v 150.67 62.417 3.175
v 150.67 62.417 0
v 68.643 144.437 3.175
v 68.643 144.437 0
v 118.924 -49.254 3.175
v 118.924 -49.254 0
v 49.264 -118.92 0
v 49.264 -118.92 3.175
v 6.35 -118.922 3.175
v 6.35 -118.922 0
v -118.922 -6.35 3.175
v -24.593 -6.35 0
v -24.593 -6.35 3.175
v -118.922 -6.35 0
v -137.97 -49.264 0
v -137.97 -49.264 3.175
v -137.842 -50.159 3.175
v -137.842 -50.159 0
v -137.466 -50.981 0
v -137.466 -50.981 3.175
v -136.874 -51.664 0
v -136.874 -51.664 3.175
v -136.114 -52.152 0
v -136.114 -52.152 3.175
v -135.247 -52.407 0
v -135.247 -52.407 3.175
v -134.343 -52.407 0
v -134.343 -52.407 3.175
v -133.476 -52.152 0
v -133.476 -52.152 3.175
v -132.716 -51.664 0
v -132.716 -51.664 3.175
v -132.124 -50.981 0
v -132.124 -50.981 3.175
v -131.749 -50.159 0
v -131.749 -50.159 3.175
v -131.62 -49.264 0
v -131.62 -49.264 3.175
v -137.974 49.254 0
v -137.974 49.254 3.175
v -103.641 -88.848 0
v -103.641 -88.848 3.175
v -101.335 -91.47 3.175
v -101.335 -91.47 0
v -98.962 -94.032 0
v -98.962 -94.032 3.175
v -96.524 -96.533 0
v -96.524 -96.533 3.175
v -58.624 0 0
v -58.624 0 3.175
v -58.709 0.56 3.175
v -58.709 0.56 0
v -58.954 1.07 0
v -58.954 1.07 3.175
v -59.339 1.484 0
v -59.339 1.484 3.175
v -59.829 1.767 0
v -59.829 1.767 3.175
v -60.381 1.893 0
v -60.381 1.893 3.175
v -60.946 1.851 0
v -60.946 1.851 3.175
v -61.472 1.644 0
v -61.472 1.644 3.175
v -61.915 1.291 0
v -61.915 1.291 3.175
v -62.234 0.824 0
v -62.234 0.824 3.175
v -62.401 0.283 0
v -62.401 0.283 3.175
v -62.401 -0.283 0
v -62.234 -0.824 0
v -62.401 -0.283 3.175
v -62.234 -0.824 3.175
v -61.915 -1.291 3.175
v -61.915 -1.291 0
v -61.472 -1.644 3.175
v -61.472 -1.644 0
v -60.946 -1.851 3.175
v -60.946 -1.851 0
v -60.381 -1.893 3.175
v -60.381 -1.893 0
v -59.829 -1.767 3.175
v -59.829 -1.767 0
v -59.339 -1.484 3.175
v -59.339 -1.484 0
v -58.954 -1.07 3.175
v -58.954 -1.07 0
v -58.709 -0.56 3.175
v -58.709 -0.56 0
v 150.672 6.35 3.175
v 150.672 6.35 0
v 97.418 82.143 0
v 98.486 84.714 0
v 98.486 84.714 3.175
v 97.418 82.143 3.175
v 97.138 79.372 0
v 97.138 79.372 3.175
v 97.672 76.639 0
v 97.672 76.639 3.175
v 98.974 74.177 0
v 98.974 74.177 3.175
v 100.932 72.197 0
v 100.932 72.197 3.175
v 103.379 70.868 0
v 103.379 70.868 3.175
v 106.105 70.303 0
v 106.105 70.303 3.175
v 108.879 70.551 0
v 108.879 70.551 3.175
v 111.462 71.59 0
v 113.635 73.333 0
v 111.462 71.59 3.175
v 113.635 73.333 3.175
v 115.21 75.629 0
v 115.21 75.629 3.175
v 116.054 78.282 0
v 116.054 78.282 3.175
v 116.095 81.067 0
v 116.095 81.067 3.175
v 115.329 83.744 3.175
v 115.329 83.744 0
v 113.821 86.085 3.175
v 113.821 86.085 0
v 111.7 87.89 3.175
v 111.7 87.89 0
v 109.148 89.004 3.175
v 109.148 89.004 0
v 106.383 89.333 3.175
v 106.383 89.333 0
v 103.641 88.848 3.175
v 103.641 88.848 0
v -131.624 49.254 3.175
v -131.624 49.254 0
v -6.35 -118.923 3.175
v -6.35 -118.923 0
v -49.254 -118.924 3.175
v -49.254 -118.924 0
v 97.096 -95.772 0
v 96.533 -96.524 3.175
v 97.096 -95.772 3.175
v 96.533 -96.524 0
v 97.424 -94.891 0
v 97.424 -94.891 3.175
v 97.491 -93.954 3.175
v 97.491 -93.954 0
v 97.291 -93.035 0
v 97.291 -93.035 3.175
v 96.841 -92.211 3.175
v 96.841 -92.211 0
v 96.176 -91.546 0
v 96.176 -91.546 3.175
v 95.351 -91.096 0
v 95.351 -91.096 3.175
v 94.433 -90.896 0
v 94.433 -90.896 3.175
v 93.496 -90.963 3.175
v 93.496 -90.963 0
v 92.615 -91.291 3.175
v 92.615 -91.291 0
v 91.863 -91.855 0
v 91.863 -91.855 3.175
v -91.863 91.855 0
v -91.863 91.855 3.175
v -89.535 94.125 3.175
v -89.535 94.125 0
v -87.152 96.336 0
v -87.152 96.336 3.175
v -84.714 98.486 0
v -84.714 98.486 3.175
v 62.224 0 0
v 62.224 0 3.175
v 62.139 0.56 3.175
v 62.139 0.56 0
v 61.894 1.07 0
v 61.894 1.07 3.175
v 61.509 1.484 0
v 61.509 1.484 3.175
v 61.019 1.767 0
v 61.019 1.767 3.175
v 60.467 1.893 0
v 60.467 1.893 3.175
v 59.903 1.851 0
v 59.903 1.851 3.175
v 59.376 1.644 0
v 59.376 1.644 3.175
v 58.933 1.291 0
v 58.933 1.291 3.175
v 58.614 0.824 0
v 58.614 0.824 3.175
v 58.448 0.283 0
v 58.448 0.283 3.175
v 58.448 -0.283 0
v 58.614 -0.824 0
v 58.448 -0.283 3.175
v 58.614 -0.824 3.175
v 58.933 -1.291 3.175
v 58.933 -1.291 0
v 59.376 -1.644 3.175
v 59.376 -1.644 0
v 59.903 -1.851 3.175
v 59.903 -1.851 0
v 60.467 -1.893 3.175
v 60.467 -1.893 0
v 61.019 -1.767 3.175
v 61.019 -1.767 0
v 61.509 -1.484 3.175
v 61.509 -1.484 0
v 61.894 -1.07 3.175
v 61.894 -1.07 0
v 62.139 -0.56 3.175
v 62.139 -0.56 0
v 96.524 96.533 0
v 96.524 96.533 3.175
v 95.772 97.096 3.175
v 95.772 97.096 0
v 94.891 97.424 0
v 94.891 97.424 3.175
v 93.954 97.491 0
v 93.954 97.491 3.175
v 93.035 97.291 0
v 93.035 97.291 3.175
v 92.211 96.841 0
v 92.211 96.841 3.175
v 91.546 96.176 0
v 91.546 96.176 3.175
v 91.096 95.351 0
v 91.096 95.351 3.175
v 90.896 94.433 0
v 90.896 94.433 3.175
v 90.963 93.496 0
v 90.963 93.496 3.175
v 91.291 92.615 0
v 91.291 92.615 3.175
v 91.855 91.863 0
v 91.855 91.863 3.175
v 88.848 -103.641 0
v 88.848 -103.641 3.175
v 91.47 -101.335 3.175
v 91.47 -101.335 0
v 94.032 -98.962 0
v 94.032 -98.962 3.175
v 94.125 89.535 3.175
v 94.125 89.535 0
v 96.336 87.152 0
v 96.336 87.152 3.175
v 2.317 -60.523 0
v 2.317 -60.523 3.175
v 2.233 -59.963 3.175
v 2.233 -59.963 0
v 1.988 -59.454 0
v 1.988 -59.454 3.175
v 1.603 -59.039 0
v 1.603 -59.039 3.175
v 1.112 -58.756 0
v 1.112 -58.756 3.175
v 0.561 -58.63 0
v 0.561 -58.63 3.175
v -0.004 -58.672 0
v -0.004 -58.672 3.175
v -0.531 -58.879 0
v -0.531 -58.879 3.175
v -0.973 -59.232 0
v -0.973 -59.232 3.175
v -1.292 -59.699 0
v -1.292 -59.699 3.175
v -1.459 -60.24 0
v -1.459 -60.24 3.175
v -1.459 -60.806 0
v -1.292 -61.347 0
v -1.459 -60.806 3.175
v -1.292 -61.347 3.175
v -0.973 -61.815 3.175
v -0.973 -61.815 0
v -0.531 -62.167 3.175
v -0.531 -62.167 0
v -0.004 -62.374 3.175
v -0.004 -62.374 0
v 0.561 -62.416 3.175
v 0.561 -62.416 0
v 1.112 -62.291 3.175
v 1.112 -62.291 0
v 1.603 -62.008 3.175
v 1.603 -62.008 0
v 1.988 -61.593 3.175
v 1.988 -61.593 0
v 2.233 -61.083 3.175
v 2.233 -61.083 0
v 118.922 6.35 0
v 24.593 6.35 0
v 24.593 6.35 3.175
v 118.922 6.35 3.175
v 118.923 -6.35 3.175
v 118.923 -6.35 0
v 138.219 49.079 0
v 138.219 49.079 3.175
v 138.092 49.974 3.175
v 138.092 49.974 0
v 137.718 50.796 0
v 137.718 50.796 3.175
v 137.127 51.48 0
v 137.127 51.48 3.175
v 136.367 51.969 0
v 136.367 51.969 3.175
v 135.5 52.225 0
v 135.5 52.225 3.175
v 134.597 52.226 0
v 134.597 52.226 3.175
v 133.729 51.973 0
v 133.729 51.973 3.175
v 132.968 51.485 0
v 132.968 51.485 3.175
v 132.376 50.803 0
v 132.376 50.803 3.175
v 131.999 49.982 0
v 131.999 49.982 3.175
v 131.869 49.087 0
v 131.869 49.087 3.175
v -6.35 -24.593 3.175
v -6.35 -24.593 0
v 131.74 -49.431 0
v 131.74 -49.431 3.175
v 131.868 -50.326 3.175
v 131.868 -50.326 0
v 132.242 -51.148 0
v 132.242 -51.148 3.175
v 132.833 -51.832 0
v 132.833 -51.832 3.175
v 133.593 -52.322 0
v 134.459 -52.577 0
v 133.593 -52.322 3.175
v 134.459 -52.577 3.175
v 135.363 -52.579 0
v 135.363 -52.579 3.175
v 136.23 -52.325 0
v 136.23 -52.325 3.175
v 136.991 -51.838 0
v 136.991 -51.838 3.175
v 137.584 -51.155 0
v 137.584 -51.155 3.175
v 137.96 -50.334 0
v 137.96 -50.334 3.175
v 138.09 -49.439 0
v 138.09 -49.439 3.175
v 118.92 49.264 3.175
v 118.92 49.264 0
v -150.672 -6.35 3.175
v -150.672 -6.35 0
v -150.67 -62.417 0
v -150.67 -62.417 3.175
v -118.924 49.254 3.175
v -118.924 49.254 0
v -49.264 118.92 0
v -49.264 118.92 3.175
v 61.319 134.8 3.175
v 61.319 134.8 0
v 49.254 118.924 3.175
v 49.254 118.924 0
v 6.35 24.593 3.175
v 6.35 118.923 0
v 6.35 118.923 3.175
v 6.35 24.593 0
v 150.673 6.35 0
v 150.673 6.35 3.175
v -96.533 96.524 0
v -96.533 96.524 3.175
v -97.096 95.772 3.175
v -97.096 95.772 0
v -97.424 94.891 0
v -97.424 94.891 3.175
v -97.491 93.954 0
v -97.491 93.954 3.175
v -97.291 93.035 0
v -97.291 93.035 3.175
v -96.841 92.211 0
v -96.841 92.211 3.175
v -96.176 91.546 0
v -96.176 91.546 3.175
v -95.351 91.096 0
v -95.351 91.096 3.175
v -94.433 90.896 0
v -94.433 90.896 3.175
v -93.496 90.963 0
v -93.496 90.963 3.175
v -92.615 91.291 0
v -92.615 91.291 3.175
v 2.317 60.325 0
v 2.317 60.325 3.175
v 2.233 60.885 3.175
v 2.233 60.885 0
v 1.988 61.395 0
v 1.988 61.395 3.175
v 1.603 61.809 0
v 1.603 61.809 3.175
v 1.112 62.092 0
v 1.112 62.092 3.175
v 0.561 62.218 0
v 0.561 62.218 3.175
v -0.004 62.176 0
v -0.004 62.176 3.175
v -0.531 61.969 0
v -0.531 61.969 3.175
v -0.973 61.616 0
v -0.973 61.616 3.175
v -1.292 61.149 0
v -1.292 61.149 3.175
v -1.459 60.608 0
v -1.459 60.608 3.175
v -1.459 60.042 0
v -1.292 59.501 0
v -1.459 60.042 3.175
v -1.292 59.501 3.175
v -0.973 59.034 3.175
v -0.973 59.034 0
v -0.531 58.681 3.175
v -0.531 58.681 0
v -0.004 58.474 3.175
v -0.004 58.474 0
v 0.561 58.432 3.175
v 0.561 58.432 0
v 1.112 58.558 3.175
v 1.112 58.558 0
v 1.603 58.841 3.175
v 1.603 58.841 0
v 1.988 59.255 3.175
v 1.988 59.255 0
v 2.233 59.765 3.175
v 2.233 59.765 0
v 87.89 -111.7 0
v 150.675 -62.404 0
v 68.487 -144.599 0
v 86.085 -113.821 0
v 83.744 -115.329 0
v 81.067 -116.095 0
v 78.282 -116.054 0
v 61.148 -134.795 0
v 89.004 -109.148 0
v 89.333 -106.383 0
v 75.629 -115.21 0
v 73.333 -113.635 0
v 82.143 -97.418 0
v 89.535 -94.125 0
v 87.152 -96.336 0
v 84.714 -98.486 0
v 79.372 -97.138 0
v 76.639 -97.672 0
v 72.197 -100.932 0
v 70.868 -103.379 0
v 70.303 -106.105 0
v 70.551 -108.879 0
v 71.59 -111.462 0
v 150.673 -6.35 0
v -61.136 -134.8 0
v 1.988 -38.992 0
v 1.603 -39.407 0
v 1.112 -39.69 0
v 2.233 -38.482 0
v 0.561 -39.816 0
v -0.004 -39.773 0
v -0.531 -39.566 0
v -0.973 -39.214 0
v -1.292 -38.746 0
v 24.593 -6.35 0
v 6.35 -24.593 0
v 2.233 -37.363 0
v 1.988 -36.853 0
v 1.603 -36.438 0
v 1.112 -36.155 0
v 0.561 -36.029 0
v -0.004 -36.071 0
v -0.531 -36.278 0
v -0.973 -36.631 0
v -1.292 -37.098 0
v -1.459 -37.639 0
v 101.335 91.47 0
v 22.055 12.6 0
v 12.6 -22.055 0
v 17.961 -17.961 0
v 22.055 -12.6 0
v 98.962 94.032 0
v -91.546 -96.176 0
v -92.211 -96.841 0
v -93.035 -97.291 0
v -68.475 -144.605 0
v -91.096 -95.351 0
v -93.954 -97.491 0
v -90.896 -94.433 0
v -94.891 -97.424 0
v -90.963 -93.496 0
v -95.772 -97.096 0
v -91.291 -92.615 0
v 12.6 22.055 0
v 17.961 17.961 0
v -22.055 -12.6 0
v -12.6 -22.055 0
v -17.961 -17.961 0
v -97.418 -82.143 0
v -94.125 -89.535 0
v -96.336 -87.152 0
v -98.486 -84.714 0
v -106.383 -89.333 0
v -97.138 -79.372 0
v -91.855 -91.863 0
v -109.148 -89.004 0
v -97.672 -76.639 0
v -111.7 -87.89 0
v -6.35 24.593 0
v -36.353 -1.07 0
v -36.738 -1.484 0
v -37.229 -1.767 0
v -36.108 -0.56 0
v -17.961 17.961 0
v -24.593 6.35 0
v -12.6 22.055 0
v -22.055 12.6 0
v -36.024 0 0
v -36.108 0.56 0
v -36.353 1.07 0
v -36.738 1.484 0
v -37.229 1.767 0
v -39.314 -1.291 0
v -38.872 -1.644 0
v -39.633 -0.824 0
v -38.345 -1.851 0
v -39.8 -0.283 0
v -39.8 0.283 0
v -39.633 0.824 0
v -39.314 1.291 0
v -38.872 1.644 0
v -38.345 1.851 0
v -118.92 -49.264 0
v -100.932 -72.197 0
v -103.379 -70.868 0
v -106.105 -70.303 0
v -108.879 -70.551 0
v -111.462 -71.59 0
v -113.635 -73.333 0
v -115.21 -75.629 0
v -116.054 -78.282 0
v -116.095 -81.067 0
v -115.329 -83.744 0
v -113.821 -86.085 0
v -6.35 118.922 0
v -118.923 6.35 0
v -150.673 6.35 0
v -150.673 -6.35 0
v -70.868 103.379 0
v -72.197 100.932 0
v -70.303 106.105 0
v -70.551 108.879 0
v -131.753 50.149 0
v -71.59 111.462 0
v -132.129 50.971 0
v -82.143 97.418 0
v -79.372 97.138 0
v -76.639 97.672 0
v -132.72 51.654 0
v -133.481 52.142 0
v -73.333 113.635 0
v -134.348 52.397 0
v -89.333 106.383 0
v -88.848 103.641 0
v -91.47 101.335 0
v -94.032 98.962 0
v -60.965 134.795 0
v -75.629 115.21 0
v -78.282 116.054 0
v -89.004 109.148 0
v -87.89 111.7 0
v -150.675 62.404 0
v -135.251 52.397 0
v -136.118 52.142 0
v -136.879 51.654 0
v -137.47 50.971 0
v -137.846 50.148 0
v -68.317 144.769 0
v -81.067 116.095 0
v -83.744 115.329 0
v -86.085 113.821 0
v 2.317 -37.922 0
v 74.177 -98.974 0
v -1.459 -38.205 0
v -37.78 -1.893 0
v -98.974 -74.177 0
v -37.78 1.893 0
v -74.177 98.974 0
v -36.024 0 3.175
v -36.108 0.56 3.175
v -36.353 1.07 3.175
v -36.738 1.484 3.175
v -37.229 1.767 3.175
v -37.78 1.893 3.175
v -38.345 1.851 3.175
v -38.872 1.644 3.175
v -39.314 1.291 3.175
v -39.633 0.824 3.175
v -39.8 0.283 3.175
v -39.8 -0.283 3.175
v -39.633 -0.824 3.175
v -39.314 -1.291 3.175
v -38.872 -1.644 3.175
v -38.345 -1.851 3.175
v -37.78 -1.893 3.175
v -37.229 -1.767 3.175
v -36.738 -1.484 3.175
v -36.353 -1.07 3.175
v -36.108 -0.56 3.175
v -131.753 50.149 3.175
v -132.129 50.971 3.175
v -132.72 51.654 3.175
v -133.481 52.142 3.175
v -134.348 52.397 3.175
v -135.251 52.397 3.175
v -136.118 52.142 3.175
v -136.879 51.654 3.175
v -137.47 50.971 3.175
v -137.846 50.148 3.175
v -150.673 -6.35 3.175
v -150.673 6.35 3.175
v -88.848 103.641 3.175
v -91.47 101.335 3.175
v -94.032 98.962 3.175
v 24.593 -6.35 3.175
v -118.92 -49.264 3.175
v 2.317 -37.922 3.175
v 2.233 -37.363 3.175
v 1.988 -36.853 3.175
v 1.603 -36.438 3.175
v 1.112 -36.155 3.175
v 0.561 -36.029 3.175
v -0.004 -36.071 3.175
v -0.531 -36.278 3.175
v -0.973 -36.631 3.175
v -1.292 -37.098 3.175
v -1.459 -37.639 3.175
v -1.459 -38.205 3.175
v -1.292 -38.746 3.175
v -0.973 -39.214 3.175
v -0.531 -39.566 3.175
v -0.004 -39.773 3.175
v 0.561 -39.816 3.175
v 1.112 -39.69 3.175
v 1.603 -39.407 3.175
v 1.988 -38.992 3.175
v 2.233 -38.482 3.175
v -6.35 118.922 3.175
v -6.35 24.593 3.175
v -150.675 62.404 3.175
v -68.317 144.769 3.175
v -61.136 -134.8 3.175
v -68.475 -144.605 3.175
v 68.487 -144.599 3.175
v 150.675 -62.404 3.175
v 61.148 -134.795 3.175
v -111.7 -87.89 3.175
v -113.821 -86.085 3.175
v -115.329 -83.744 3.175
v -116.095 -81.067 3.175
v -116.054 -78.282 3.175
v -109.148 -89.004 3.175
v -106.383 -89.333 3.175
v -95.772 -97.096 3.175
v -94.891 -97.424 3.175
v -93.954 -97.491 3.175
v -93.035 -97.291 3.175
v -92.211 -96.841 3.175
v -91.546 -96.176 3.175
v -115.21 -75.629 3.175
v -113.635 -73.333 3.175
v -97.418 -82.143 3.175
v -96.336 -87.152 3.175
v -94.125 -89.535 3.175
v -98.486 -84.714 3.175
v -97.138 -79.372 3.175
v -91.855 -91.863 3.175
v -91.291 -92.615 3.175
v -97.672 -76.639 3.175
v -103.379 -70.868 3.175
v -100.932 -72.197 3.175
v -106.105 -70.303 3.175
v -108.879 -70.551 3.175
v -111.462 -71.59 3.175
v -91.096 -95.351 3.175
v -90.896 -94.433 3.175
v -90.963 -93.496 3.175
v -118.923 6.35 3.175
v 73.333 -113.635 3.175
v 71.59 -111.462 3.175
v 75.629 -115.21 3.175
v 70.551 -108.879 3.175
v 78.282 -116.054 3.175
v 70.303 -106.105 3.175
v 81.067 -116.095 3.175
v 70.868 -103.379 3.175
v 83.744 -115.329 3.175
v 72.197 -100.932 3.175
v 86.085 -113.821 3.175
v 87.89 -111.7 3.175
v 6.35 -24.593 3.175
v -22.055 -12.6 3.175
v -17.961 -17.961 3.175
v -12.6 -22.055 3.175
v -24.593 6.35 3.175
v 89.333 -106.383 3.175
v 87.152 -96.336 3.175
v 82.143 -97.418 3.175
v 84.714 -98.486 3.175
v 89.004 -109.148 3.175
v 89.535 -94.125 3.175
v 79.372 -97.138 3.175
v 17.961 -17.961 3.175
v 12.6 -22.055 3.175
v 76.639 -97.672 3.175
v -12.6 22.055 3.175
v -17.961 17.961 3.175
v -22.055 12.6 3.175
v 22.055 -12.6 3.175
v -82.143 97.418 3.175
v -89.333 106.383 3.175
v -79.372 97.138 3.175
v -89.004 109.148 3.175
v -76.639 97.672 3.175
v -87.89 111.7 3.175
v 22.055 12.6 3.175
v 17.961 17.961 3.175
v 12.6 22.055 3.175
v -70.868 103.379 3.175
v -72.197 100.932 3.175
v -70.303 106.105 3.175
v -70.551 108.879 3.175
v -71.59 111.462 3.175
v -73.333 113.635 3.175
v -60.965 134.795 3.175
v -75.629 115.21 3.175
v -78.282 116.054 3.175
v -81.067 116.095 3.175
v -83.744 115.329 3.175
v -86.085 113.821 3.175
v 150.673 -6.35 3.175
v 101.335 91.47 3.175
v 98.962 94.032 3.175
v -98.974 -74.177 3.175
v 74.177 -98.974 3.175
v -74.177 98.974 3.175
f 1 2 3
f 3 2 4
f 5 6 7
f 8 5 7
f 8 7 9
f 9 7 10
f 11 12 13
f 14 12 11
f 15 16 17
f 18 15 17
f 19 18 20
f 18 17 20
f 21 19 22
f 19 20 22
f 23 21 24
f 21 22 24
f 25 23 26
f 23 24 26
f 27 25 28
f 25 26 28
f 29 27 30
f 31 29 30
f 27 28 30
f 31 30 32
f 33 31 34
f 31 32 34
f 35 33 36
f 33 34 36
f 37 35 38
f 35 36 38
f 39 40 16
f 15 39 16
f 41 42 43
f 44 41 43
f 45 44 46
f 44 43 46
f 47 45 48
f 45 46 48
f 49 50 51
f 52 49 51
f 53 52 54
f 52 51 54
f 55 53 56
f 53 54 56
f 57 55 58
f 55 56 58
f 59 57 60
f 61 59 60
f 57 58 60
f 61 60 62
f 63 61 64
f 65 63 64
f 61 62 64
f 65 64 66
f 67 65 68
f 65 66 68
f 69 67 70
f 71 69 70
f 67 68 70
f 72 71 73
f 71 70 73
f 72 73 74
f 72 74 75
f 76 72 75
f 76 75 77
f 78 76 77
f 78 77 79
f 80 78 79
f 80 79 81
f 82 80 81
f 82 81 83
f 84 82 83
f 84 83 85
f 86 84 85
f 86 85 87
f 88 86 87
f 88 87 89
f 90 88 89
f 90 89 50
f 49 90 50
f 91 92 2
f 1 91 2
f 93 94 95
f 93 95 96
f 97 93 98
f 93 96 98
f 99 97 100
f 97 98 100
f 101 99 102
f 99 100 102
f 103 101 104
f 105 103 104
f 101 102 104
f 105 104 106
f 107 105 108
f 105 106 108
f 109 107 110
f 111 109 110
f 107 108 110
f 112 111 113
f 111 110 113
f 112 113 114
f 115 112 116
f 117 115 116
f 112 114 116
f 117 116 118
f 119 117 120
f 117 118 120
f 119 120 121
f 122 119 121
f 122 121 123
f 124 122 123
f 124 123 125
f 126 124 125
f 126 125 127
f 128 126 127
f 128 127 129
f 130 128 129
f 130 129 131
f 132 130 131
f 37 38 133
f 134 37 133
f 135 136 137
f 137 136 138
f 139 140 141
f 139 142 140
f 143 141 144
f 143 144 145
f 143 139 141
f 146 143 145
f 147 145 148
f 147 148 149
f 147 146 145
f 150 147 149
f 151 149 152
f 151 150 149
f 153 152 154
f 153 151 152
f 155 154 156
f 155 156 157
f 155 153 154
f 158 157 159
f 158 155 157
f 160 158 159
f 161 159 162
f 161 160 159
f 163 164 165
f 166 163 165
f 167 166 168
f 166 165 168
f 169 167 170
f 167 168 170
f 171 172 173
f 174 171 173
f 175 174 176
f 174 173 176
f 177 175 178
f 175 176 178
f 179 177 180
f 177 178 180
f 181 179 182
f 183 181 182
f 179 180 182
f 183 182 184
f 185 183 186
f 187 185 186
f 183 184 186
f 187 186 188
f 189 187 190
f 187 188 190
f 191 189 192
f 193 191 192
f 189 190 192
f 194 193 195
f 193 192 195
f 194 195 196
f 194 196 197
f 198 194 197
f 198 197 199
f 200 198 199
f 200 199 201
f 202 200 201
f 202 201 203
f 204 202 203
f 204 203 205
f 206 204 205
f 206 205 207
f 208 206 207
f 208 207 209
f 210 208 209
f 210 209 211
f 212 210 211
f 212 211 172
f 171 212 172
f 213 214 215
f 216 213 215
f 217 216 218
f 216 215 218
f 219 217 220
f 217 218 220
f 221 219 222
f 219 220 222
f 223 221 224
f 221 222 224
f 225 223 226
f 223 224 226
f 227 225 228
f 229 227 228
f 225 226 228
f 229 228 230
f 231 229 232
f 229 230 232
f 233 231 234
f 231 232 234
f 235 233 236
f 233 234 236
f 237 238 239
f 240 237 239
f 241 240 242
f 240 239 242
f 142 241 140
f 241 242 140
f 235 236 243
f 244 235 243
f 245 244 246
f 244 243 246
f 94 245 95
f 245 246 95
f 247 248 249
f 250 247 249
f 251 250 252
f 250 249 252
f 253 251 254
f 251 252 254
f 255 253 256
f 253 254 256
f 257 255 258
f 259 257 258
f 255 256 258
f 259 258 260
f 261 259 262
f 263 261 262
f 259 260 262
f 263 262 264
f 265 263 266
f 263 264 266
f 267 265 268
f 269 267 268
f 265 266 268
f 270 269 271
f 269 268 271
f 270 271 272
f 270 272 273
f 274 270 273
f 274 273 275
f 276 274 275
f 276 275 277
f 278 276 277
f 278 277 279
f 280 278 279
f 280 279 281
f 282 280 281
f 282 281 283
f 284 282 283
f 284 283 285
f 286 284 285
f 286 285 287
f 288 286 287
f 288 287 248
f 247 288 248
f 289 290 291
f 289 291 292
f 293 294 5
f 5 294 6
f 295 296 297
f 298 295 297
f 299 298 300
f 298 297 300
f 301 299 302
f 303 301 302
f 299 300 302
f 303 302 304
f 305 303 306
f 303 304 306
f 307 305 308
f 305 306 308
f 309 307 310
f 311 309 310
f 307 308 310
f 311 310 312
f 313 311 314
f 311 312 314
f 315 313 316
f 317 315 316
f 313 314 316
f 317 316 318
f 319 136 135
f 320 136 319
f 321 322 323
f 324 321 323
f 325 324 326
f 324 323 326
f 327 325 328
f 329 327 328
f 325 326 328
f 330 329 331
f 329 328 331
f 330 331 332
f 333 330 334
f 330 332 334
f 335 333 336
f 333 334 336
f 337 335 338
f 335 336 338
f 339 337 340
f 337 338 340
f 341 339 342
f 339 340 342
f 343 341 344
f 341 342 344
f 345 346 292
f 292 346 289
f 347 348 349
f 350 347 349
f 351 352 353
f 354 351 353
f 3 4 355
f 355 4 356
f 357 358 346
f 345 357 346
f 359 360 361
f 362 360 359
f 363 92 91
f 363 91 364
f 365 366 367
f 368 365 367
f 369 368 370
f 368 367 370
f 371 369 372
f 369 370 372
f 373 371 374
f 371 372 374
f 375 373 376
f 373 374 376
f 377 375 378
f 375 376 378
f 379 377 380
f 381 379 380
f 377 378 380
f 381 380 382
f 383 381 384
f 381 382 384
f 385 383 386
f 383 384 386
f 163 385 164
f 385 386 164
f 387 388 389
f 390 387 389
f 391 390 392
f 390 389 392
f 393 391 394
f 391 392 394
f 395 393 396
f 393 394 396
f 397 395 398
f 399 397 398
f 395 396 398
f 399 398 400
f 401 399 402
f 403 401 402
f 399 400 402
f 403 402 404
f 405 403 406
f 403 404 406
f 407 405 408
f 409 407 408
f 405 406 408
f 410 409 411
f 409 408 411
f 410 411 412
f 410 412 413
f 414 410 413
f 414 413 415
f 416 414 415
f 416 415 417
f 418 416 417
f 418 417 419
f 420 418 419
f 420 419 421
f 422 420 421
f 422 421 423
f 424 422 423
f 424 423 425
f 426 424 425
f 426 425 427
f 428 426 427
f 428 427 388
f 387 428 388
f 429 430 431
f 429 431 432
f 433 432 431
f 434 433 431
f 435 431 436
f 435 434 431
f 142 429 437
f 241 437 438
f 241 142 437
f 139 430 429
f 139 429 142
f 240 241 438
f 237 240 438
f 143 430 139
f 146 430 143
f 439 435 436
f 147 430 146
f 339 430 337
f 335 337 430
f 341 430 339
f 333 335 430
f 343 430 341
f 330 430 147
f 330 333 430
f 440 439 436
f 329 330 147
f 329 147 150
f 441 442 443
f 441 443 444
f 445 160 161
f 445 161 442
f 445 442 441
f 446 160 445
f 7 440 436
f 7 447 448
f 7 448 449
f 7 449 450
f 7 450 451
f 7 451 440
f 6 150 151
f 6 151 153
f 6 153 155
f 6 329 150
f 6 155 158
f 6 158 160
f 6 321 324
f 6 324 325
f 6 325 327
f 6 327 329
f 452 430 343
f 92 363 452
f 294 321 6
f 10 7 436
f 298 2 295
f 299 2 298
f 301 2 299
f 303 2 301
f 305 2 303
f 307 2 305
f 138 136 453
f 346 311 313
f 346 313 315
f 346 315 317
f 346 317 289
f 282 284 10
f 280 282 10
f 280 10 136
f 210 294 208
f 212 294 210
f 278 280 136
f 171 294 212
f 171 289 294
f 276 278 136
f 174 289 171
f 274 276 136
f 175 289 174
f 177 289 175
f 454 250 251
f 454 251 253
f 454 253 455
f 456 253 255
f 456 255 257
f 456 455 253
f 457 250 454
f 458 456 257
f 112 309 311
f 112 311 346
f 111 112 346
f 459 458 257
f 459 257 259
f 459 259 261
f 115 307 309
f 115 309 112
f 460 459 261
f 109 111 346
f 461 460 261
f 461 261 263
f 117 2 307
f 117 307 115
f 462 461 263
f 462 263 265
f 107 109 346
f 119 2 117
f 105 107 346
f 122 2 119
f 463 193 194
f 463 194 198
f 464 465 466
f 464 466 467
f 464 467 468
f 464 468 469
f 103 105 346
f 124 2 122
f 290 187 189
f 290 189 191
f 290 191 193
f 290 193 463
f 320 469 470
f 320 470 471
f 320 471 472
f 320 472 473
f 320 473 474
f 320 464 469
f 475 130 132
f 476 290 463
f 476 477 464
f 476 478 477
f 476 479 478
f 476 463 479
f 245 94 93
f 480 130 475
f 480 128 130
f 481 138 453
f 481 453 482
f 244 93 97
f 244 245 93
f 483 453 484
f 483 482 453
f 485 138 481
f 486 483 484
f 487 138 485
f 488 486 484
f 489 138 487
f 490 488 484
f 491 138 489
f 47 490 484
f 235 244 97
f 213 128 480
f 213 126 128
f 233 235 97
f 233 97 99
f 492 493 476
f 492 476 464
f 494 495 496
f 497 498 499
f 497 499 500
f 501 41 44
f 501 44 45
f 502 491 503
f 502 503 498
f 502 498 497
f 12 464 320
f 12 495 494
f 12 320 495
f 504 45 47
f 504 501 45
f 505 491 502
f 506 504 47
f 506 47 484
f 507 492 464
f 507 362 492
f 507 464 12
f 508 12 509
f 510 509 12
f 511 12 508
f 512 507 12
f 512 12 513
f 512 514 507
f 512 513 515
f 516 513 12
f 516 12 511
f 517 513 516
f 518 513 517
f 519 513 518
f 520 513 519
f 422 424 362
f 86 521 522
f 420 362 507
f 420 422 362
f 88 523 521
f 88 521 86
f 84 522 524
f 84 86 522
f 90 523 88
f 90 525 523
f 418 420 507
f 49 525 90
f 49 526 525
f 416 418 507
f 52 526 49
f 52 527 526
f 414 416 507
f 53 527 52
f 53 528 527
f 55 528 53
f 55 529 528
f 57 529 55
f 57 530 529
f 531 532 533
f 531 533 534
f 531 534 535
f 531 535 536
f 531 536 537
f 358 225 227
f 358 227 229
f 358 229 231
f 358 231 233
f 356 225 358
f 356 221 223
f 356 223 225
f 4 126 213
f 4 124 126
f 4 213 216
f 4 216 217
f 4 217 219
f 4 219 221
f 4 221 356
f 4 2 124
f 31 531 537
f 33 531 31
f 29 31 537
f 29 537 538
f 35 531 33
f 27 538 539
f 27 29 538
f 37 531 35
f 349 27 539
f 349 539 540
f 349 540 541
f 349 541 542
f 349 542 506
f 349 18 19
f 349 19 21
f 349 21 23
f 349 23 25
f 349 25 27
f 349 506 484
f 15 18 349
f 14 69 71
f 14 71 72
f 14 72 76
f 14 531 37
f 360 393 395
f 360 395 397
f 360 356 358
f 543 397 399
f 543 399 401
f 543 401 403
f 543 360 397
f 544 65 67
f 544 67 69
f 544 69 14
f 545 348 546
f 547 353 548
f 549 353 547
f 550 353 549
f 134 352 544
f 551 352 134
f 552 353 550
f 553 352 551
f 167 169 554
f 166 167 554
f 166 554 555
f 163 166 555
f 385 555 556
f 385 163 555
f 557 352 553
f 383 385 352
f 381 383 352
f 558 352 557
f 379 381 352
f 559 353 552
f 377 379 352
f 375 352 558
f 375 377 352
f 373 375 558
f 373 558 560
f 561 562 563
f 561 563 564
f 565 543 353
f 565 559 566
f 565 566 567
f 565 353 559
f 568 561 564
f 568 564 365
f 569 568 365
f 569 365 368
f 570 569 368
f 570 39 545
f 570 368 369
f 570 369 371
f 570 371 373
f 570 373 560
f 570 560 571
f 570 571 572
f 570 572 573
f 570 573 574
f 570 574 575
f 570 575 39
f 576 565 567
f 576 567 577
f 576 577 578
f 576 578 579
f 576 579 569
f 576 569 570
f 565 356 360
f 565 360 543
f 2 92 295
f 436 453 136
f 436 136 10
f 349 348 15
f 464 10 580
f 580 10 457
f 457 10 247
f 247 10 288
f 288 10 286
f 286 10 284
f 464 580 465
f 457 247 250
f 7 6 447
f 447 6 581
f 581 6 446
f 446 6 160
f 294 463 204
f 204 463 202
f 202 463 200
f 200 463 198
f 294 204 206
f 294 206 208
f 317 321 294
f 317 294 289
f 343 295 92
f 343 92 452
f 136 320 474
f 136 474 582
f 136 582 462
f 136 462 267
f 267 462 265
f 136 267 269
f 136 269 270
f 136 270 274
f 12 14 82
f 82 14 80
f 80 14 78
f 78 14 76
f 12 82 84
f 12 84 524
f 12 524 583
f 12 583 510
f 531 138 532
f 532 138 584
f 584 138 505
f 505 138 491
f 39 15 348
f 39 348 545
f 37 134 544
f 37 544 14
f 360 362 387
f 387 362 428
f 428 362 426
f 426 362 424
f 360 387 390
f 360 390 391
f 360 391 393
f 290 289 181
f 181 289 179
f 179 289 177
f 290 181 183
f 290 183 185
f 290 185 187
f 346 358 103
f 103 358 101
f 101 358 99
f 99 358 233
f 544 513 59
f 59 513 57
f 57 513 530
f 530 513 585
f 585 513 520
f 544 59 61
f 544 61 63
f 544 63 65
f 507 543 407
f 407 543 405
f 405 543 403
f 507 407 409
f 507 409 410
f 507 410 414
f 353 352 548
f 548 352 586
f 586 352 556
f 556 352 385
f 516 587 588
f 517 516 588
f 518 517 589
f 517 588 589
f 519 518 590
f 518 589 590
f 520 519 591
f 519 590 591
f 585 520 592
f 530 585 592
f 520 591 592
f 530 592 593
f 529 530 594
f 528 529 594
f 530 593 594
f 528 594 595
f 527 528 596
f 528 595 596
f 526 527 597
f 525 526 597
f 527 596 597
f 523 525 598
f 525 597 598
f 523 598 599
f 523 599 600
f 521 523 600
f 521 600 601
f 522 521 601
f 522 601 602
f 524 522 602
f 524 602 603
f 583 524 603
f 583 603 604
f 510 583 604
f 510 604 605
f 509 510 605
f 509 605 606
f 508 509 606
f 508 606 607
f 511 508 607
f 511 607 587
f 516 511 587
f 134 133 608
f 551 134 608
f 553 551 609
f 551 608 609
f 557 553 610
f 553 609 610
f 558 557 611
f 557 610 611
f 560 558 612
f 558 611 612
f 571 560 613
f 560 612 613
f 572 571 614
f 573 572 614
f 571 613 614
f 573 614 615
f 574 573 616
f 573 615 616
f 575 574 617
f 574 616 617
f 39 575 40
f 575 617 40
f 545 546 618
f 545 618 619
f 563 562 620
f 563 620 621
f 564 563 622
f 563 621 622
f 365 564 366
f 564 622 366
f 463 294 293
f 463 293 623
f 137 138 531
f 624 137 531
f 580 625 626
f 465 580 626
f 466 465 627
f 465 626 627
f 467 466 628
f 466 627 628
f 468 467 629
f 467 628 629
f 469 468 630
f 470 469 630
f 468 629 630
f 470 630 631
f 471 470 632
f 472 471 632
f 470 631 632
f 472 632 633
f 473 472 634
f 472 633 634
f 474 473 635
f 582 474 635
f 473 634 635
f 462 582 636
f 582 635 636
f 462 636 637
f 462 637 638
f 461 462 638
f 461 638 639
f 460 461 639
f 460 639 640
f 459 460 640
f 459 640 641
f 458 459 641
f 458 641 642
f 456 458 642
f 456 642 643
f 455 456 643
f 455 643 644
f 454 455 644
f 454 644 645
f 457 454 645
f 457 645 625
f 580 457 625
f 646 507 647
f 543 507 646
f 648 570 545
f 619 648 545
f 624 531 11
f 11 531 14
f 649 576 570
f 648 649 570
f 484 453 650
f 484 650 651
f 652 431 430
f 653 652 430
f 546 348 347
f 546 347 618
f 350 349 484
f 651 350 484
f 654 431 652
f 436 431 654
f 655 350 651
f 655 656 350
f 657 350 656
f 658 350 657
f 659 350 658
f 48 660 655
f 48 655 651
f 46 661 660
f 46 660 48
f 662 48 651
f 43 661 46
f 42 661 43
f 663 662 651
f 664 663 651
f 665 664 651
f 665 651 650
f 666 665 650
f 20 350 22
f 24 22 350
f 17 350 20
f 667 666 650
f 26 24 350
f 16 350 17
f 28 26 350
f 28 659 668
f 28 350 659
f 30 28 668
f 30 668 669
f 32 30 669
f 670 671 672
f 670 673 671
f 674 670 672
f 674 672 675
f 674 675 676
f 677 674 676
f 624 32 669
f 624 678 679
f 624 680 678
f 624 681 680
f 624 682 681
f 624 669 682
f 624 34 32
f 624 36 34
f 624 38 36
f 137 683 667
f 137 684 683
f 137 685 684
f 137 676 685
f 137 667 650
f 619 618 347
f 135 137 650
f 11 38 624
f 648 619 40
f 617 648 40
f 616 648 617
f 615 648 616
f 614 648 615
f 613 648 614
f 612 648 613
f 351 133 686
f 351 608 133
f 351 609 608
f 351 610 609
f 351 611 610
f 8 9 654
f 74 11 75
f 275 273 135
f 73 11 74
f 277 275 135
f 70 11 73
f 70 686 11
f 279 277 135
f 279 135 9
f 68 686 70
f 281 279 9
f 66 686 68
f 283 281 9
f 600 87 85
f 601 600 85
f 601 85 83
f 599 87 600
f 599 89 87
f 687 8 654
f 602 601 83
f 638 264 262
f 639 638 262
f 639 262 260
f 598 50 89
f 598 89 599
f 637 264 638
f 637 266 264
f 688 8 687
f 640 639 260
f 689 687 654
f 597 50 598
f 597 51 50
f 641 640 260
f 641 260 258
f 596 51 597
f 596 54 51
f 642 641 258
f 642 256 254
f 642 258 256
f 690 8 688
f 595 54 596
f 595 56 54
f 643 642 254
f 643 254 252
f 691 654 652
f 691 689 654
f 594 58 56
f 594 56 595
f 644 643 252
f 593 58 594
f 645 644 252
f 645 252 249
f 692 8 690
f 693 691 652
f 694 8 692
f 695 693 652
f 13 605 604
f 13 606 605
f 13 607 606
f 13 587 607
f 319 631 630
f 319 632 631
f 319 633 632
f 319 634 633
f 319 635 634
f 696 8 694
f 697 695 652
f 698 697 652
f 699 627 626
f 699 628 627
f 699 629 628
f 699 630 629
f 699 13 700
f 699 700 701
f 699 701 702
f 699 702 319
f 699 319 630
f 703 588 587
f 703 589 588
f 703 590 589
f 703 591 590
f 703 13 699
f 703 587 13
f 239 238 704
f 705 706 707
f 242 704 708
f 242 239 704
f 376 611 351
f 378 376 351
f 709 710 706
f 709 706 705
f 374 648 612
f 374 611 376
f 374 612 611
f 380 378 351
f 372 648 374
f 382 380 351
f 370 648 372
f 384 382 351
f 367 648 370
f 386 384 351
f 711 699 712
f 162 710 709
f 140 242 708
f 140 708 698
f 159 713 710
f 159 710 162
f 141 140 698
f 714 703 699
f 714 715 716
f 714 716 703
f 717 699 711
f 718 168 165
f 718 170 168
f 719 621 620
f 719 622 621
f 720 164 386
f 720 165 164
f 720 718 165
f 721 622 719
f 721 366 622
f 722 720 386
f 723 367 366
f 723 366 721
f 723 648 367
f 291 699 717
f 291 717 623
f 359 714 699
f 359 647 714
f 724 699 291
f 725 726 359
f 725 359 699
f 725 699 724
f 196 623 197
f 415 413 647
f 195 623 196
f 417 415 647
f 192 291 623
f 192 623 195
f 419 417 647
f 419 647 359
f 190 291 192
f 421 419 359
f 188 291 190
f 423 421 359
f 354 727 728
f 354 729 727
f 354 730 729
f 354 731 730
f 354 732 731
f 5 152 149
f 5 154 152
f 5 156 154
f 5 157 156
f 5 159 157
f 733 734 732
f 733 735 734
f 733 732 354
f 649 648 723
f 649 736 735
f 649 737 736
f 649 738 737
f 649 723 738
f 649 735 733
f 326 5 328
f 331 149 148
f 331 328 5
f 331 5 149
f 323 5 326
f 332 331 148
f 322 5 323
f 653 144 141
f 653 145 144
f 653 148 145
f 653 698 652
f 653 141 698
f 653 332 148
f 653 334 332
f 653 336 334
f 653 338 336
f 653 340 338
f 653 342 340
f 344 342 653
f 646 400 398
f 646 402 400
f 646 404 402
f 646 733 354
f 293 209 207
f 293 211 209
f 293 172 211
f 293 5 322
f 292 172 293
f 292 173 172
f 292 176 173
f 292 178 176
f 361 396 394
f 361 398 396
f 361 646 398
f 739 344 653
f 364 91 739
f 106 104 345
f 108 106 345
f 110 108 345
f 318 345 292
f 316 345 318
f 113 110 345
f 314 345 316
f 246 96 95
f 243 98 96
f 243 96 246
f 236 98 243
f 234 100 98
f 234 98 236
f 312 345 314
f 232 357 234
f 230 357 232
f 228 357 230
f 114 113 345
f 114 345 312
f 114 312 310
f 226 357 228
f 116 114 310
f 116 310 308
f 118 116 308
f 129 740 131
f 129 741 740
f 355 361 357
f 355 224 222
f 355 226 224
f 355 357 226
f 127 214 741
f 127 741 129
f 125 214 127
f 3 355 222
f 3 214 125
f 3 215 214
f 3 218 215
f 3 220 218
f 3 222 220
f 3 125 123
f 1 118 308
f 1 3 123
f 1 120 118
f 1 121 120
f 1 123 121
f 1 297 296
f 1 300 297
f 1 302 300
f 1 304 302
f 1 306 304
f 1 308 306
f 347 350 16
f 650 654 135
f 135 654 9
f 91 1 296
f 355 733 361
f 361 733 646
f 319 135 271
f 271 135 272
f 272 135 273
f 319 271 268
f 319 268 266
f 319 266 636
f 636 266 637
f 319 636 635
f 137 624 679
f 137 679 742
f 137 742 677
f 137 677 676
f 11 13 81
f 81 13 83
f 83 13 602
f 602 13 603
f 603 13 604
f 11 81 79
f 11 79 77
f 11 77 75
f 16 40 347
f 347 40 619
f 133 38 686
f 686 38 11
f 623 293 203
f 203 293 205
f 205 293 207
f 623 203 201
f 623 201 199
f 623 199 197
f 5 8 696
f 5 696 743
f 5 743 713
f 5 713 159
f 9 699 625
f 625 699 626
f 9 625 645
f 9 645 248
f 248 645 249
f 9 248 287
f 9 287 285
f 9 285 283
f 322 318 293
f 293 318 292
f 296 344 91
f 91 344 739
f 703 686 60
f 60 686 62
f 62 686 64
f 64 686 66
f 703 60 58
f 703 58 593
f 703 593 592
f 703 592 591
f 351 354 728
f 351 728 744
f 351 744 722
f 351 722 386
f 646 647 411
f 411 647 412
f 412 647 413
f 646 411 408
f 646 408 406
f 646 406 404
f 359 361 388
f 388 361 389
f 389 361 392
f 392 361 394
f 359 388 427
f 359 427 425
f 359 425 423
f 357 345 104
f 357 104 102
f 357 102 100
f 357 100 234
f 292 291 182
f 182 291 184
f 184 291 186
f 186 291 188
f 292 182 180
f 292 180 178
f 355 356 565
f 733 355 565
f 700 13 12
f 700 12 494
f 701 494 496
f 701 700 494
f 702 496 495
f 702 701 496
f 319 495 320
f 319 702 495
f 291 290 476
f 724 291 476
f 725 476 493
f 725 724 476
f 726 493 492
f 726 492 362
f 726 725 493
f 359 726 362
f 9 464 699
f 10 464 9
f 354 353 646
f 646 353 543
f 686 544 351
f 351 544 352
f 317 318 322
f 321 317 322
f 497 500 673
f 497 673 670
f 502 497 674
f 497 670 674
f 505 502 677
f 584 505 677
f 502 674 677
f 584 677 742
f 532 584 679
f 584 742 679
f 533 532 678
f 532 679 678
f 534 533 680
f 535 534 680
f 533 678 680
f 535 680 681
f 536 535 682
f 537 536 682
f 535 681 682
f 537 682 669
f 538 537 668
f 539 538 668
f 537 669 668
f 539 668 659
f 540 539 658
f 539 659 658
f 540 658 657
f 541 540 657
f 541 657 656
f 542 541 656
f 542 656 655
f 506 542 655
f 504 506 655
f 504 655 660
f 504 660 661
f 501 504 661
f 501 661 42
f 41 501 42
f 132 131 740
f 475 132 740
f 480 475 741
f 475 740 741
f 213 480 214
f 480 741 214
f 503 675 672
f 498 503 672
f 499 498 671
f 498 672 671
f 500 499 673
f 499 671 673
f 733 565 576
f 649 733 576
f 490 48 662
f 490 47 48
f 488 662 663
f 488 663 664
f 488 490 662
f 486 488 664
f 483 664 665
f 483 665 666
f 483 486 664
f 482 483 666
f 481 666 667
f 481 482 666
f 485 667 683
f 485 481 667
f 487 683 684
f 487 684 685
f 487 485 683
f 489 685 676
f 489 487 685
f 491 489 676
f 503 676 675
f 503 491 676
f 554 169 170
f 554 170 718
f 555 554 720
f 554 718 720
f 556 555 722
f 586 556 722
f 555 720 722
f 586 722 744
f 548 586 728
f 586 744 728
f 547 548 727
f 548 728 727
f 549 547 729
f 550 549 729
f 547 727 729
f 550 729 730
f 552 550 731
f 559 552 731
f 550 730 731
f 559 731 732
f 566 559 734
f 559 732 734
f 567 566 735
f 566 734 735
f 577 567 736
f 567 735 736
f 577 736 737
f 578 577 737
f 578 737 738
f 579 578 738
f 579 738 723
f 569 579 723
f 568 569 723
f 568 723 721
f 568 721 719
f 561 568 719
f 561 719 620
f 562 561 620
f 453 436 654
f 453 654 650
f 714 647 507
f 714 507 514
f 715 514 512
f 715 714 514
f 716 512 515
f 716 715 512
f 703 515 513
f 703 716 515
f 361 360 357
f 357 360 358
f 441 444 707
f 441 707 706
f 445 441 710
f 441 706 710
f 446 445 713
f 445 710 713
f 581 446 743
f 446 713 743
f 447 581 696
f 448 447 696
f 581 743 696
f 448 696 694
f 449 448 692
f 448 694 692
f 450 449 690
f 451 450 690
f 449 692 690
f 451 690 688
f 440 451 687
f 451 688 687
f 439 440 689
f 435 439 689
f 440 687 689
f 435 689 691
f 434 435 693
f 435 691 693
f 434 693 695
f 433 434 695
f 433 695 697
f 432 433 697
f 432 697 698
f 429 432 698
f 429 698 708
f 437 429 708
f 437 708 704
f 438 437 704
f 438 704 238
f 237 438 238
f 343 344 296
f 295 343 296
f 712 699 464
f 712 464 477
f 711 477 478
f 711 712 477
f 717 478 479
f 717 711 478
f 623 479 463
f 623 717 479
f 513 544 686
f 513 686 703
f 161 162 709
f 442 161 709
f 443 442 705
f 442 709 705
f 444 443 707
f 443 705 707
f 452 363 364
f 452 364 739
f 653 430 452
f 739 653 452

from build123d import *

# Parameters (mm, degrees)
BOSS_EXTRUDE1_DEPTH       = 3.175
SKETCH2_R                 = 3.302
BOSS_EXTRUDE2_DEPTH       = 3.175
BOSS_EXTRUDE3_DEPTH       = 3.175
BOSS_EXTRUDE4_DEPTH       = 3.175
SKETCH10_R                = 3.302
CUT_EXTRUDE2_DEPTH        = 3.175
BOSS_EXTRUDE6_DEPTH       = 3.175
F_6_CLEARANCE_HOLE1_D     = 3.7973
F_6_CLEARANCE_HOLE1_DEPTH = 25.4
F_6_CLEARANCE_HOLE1_TIP   = 1.140824014
CUT_EXTRUDE8_DEPTH        = 4.7625
SKETCH4_R                 = 25.4
BOSS_EXTRUDE7_DEPTH       = 3.175
CUT_EXTRUDE9_DEPTH        = 3.175
SKETCH19_R                = 9.525
CUT_EXTRUDE10_DEPTH       = 3.175
CUT_EXTRUDE12_DEPTH       = 4.175


with BuildPart() as part:
    # Sketch1 → Boss-Extrude1 (new body)
    with BuildSketch(Plane.XY):
        Polygon((-150.669615327, -62.417005507), (-62.404018861, -150.674994572), (62.417005507, -150.669615327), (150.674994572, -62.404018861), (150.669615327, 62.417005507), (62.404018861, 150.674994572), (-62.417005507, 150.669615327), (-150.674994572, 62.404018861), align=None)
        Polygon((-137.969842044, -57.155945955), (-57.144053939, -137.974767879), (57.155945955, -137.969842044), (137.974767879, -57.144053939), (137.969842044, 57.155945955), (57.144053939, 137.974767879), (-57.155945955, 137.969842044), (-137.974767879, 57.144053939), align=None, mode=Mode.SUBTRACT)
    extrude(amount=BOSS_EXTRUDE1_DEPTH)

    # Sketch2 → Boss-Extrude2 (add)
    with BuildSketch(Plane.XY.offset(3.175)):
        with BuildLine():
            Line((-104.300258744, 90.821465649), (-90.83045509, 104.292430334))
            ThreePointArc((-90.83045509, 104.292430334), (-90.829874575, 90.822046164), (-104.300258744, 90.821465649))
        make_face()
        with Locations((-94.197615746, 94.189497078)):
            Circle(SKETCH2_R, mode=Mode.SUBTRACT)
        with BuildLine():
            Line((104.292430334, 90.83045509), (90.821465649, 104.300258744))
            ThreePointArc((90.821465649, 104.300258744), (90.822046164, 90.829874575), (104.292430334, 90.83045509))
        make_face()
        with Locations((94.189497078, 94.197615746)):
            Circle(SKETCH2_R, mode=Mode.SUBTRACT)
        with BuildLine():
            Line((104.300258744, -90.821465649), (90.83045509, -104.292430334))
            ThreePointArc((90.83045509, -104.292430334), (90.829874575, -90.822046164), (104.300258744, -90.821465649))
        make_face()
        with Locations((94.197615746, -94.189497078)):
            Circle(SKETCH2_R, mode=Mode.SUBTRACT)
        with BuildLine():
            Line((-104.292430334, -90.83045509), (-90.821465649, -104.300258744))
            ThreePointArc((-90.821465649, -104.300258744), (-90.822046164, -90.829874575), (-104.292430334, -90.83045509))
        make_face()
        with Locations((-94.189497078, -94.197615746)):
            Circle(SKETCH2_R, mode=Mode.SUBTRACT)
    extrude(amount=-BOSS_EXTRUDE2_DEPTH)

    # Sketch5 → Boss-Extrude3 (add)
    with BuildSketch(Plane.XY.offset(3.175)):
        with BuildLine():
            Line((137.970389359, 44.455945967), (137.969842044, 57.155945955))
            Line((137.969842044, 57.155945955), (128.989198921, 66.135815058))
            ThreePointArc((128.989198921, 66.135815058), (126.236781441, 52.295360716), (137.970389359, 44.455945967))
        make_face()
        with BuildLine():
            Line((128.994898776, -66.124697061), (137.974767879, -57.144053939))
            Line((137.974767879, -57.144053939), (137.974220564, -44.44405395))
            ThreePointArc((137.974220564, -44.44405395), (126.241288378, -52.284480005), (128.994898776, -66.124697061))
        make_face()
        with BuildLine():
            Line((-137.969842044, -57.155945955), (-137.970389359, -44.455945967))
            ThreePointArc((-137.970389359, -44.455945967), (-126.236781441, -52.295360716), (-128.989198921, -66.135815058))
            Line((-128.989198921, -66.135815058), (-137.969842044, -57.155945955))
        make_face()
        with BuildLine():
            Line((-137.974220564, 44.44405395), (-137.974767879, 57.144053939))
            Line((-137.974767879, 57.144053939), (-128.994898776, 66.124697061))
            ThreePointArc((-128.994898776, 66.124697061), (-126.241288378, 52.284480005), (-137.974220564, 44.44405395))
        make_face()
    extrude(amount=-BOSS_EXTRUDE3_DEPTH)

    # Sketch9 → Boss-Extrude4 (add)
    with BuildSketch(Plane(origin=(0, 0, 0), x_dir=(-1, 0, 0), z_dir=(0, 0, -1))):
        Polygon((-57.144053939, 137.974767879), (-137.969842044, 57.155945955), (-137.974767879, -57.144053939), (-57.155945955, -137.969842044), (57.144053939, -137.974767879), (137.969842044, -57.155945955), (137.974767879, 57.144053939), (57.155945955, 137.969842044), align=None)
        Polygon((-49.254106555, 118.924427839), (-118.92018212, 49.264356627), (-118.924427839, -49.254106555), (-49.264356627, -118.92018212), (49.254106555, -118.924427839), (118.92018212, -49.264356627), (118.924427839, 49.254106555), (49.264356627, 118.92018212), align=None, mode=Mode.SUBTRACT)
    extrude(amount=-BOSS_EXTRUDE4_DEPTH)

    # Sketch10 → Cut-Extrude2 (cut)
    with BuildSketch(Plane.XY):
        with Locations((-94.197615746, 94.189497078)):
            Circle(SKETCH10_R)
        with Locations((94.189497078, 94.197615746)):
            Circle(SKETCH10_R)
        with Locations((-94.189497078, -94.197615746)):
            Circle(SKETCH10_R)
        with Locations((94.197615746, -94.189497078)):
            Circle(SKETCH10_R)
    extrude(amount=CUT_EXTRUDE2_DEPTH, mode=Mode.SUBTRACT)

    # Sketch12 → Boss-Extrude6 (add)
    with BuildSketch(Plane(origin=(0, 0, 0), x_dir=(-1, 0, 0), z_dir=(0, 0, -1))):
        Polygon((6.35, 150.672031572), (-6.35, 150.672031572), (-6.35, 6.35), (-150.672578887, 6.35), (-150.672578887, -6.35), (-6.35, -6.35), (-6.35, -150.672031572), (6.35, -150.672031572), (6.35, -6.35), (150.672578887, -6.35), (150.672578887, 6.35), (6.35, 6.35), align=None)
    extrude(amount=-BOSS_EXTRUDE6_DEPTH)

    # #6 Clearance Hole1
    with Locations(Plane(origin=(0, 0, 0), x_dir=(-1, 0, 0), z_dir=(0, 0, -1))):
        with Locations((-0.418811464, 60.325), (-0.418811464, -37.9222), (-0.418811464, -60.52312), (37.9222, 0), (60.52312, 0), (-60.325, 0)):
            Hole(F_6_CLEARANCE_HOLE1_D / 2, depth=F_6_CLEARANCE_HOLE1_DEPTH)
            with Locations((0, 0, -(F_6_CLEARANCE_HOLE1_DEPTH + F_6_CLEARANCE_HOLE1_TIP / 2))):  # 118° drill point
                Cone(0, F_6_CLEARANCE_HOLE1_D / 2, F_6_CLEARANCE_HOLE1_TIP, mode=Mode.SUBTRACT)

    # Sketch17 → Cut-Extrude8 (cut)
    with BuildSketch(Plane(origin=(0, 0, 0), x_dir=(-1, 0, 0), z_dir=(0, 0, -1))):
        Polygon((-73.383632924, 150.675467746), (-61.318869739, 134.799947792), (60.965361784, 134.794677872), (72.666366941, 150.669173624), align=None)
        Polygon((-61.147982987, -134.794670002), (61.136248536, -134.799939922), (73.018390518, -150.675452006), (-73.031609347, -150.669157884), align=None)
    extrude(amount=-CUT_EXTRUDE8_DEPTH, mode=Mode.SUBTRACT)

    # Sketch4 → Boss-Extrude7 (add)
    with BuildSketch(Plane.XY.offset(3.175)):
        Circle(SKETCH4_R)
    extrude(amount=-BOSS_EXTRUDE7_DEPTH)

    # Sketch18 → Cut-Extrude9 (cut)
    with BuildSketch(Plane.XY.offset(3.175)):
        with BuildLine():
            ThreePointArc((109.296804613, 81.790472735), (103.174175191, 89.389946316), (96.524263045, 96.532582958))
            ThreePointArc((96.524263045, 96.532582958), (91.854529866, 96.532381713), (91.854731111, 91.862648534))
            ThreePointArc((91.854731111, 91.862648534), (98.182941997, 85.065549572), (104.009378392, 77.833713966))
            ThreePointArc((104.009378392, 77.833713966), (108.631470887, 77.16838024), (109.296804613, 81.790472735))
        make_face()
        with BuildLine():
            ThreePointArc((81.790472735, -109.296804613), (89.389946316, -103.174175191), (96.532582958, -96.524263045))
            ThreePointArc((96.532582958, -96.524263045), (96.532381713, -91.854529866), (91.862648534, -91.854731111))
            ThreePointArc((91.862648534, -91.854731111), (85.065549572, -98.182941997), (77.833713966, -104.009378392))
            ThreePointArc((77.833713966, -104.009378392), (77.16838024, -108.631470887), (81.790472735, -109.296804613))
        make_face()
        with BuildLine():
            ThreePointArc((-109.296804613, -81.790472735), (-103.174175191, -89.389946316), (-96.524263045, -96.532582958))
            ThreePointArc((-96.524263045, -96.532582958), (-91.854529866, -96.532381713), (-91.854731111, -91.862648534))
            ThreePointArc((-91.854731111, -91.862648534), (-98.182941997, -85.065549572), (-104.009378392, -77.833713966))
            ThreePointArc((-104.009378392, -77.833713966), (-108.631470887, -77.16838024), (-109.296804613, -81.790472735))
        make_face()
        with BuildLine():
            ThreePointArc((-81.790472735, 109.296804613), (-89.389946316, 103.174175191), (-96.532582958, 96.524263045))
            ThreePointArc((-96.532582958, 96.524263045), (-96.532381713, 91.854529866), (-91.862648534, 91.854731111))
            ThreePointArc((-91.862648534, 91.854731111), (-85.065549572, 98.182941997), (-77.833713966, 104.009378392))
            ThreePointArc((-77.833713966, 104.009378392), (-77.16838024, 108.631470887), (-81.790472735, 109.296804613))
        make_face()
    extrude(amount=-CUT_EXTRUDE9_DEPTH, mode=Mode.SUBTRACT)

    # Sketch19 → Cut-Extrude10 (cut)
    with BuildSketch(Plane.XY.offset(3.175)):
        with Locations((-79.81209335, 106.653091503)):
            Circle(SKETCH19_R)
        with Locations((106.653091503, 79.81209335)):
            Circle(SKETCH19_R)
        with Locations((79.81209335, -106.653091503)):
            Circle(SKETCH19_R)
        with Locations((-106.653091503, -79.81209335)):
            Circle(SKETCH19_R)
    extrude(amount=-CUT_EXTRUDE10_DEPTH, mode=Mode.SUBTRACT)

    # Sketch22 → Cut-Extrude12 (cut, through all)
    with BuildSketch(Plane.XY.offset(3.175)):
        with BuildLine():
            Line((-137.97442785, 49.253969726), (-137.970182132, -49.264493456))
            ThreePointArc((-137.970182132, -49.264493456), (-134.795045306, -52.439356624), (-131.620182138, -49.264219798))
            Line((-131.620182138, -49.264219798), (-131.624427856, 49.254243384))
            ThreePointArc((-131.624427856, 49.254243384), (-134.799564682, 52.429106552), (-137.97442785, 49.253969726))
        make_face()
        with BuildLine():
            Line((131.869384327, 49.087223722), (131.740243733, -49.431154911))
            ThreePointArc((131.740243733, -49.431154911), (134.911079132, -52.610314057), (138.090238278, -49.439478658))
            Line((138.090238278, -49.439478658), (138.219378871, 49.078899975))
            ThreePointArc((138.219378871, 49.078899975), (135.048543473, 52.258059121), (131.869384327, 49.087223722))
        make_face()
    extrude(amount=-CUT_EXTRUDE12_DEPTH, mode=Mode.SUBTRACT)


solid = part.part
